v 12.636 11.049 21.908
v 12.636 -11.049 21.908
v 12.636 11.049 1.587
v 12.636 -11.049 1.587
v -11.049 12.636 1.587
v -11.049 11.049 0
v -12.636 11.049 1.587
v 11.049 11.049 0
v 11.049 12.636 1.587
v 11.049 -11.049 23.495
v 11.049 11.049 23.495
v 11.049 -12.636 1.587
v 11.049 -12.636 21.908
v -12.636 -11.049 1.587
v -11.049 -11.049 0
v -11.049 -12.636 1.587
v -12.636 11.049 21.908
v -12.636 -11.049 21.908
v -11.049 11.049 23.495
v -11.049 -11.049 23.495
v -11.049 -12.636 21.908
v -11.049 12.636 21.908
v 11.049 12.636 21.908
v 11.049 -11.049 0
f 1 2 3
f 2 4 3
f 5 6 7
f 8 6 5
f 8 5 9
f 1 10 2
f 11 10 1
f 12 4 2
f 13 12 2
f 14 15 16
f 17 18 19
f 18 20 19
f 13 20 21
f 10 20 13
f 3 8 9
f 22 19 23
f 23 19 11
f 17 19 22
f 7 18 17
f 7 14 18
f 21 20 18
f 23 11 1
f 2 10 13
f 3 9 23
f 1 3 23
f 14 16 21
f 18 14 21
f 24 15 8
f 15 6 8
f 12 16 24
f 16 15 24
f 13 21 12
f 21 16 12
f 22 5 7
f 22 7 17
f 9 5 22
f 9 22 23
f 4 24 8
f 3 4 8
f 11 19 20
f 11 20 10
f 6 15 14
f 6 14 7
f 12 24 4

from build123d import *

# Parameters (mm, degrees)
SKETCH1_W           = 25.273
SKETCH1_H           = 25.273
BOSS_EXTRUDE1_DEPTH = 23.495
CHAMFER2_SIZE       = 1.5875


with BuildPart() as part:
    # Sketch1 → Boss-Extrude1 (new body)
    with BuildSketch(Plane.XY):
        Rectangle(SKETCH1_W, SKETCH1_H)
    extrude(amount=BOSS_EXTRUDE1_DEPTH)

    # Chamfer2
    chamfer2_edges = [part.edges().sort_by_distance(p)[0] for p in [
        (-12.6365, 0, 23.495),
        (0, -12.6365, 23.495),
        (12.6365, 0, 23.495),
        (0, -12.6365, 0),
        (-12.6365, 0, 0),
        (0, 12.6365, 0),
        (12.6365, 0, 0),
        (0, 12.6365, 23.495),
        (12.6365, -12.6365, 11.7475),
        (-12.6365, -12.6365, 11.7475),
        (-12.6365, 12.6365, 11.7475),
        (12.6365, 12.6365, 11.7475),
    ]]
    chamfer(chamfer2_edges, length=CHAMFER2_SIZE)


solid = part.part
